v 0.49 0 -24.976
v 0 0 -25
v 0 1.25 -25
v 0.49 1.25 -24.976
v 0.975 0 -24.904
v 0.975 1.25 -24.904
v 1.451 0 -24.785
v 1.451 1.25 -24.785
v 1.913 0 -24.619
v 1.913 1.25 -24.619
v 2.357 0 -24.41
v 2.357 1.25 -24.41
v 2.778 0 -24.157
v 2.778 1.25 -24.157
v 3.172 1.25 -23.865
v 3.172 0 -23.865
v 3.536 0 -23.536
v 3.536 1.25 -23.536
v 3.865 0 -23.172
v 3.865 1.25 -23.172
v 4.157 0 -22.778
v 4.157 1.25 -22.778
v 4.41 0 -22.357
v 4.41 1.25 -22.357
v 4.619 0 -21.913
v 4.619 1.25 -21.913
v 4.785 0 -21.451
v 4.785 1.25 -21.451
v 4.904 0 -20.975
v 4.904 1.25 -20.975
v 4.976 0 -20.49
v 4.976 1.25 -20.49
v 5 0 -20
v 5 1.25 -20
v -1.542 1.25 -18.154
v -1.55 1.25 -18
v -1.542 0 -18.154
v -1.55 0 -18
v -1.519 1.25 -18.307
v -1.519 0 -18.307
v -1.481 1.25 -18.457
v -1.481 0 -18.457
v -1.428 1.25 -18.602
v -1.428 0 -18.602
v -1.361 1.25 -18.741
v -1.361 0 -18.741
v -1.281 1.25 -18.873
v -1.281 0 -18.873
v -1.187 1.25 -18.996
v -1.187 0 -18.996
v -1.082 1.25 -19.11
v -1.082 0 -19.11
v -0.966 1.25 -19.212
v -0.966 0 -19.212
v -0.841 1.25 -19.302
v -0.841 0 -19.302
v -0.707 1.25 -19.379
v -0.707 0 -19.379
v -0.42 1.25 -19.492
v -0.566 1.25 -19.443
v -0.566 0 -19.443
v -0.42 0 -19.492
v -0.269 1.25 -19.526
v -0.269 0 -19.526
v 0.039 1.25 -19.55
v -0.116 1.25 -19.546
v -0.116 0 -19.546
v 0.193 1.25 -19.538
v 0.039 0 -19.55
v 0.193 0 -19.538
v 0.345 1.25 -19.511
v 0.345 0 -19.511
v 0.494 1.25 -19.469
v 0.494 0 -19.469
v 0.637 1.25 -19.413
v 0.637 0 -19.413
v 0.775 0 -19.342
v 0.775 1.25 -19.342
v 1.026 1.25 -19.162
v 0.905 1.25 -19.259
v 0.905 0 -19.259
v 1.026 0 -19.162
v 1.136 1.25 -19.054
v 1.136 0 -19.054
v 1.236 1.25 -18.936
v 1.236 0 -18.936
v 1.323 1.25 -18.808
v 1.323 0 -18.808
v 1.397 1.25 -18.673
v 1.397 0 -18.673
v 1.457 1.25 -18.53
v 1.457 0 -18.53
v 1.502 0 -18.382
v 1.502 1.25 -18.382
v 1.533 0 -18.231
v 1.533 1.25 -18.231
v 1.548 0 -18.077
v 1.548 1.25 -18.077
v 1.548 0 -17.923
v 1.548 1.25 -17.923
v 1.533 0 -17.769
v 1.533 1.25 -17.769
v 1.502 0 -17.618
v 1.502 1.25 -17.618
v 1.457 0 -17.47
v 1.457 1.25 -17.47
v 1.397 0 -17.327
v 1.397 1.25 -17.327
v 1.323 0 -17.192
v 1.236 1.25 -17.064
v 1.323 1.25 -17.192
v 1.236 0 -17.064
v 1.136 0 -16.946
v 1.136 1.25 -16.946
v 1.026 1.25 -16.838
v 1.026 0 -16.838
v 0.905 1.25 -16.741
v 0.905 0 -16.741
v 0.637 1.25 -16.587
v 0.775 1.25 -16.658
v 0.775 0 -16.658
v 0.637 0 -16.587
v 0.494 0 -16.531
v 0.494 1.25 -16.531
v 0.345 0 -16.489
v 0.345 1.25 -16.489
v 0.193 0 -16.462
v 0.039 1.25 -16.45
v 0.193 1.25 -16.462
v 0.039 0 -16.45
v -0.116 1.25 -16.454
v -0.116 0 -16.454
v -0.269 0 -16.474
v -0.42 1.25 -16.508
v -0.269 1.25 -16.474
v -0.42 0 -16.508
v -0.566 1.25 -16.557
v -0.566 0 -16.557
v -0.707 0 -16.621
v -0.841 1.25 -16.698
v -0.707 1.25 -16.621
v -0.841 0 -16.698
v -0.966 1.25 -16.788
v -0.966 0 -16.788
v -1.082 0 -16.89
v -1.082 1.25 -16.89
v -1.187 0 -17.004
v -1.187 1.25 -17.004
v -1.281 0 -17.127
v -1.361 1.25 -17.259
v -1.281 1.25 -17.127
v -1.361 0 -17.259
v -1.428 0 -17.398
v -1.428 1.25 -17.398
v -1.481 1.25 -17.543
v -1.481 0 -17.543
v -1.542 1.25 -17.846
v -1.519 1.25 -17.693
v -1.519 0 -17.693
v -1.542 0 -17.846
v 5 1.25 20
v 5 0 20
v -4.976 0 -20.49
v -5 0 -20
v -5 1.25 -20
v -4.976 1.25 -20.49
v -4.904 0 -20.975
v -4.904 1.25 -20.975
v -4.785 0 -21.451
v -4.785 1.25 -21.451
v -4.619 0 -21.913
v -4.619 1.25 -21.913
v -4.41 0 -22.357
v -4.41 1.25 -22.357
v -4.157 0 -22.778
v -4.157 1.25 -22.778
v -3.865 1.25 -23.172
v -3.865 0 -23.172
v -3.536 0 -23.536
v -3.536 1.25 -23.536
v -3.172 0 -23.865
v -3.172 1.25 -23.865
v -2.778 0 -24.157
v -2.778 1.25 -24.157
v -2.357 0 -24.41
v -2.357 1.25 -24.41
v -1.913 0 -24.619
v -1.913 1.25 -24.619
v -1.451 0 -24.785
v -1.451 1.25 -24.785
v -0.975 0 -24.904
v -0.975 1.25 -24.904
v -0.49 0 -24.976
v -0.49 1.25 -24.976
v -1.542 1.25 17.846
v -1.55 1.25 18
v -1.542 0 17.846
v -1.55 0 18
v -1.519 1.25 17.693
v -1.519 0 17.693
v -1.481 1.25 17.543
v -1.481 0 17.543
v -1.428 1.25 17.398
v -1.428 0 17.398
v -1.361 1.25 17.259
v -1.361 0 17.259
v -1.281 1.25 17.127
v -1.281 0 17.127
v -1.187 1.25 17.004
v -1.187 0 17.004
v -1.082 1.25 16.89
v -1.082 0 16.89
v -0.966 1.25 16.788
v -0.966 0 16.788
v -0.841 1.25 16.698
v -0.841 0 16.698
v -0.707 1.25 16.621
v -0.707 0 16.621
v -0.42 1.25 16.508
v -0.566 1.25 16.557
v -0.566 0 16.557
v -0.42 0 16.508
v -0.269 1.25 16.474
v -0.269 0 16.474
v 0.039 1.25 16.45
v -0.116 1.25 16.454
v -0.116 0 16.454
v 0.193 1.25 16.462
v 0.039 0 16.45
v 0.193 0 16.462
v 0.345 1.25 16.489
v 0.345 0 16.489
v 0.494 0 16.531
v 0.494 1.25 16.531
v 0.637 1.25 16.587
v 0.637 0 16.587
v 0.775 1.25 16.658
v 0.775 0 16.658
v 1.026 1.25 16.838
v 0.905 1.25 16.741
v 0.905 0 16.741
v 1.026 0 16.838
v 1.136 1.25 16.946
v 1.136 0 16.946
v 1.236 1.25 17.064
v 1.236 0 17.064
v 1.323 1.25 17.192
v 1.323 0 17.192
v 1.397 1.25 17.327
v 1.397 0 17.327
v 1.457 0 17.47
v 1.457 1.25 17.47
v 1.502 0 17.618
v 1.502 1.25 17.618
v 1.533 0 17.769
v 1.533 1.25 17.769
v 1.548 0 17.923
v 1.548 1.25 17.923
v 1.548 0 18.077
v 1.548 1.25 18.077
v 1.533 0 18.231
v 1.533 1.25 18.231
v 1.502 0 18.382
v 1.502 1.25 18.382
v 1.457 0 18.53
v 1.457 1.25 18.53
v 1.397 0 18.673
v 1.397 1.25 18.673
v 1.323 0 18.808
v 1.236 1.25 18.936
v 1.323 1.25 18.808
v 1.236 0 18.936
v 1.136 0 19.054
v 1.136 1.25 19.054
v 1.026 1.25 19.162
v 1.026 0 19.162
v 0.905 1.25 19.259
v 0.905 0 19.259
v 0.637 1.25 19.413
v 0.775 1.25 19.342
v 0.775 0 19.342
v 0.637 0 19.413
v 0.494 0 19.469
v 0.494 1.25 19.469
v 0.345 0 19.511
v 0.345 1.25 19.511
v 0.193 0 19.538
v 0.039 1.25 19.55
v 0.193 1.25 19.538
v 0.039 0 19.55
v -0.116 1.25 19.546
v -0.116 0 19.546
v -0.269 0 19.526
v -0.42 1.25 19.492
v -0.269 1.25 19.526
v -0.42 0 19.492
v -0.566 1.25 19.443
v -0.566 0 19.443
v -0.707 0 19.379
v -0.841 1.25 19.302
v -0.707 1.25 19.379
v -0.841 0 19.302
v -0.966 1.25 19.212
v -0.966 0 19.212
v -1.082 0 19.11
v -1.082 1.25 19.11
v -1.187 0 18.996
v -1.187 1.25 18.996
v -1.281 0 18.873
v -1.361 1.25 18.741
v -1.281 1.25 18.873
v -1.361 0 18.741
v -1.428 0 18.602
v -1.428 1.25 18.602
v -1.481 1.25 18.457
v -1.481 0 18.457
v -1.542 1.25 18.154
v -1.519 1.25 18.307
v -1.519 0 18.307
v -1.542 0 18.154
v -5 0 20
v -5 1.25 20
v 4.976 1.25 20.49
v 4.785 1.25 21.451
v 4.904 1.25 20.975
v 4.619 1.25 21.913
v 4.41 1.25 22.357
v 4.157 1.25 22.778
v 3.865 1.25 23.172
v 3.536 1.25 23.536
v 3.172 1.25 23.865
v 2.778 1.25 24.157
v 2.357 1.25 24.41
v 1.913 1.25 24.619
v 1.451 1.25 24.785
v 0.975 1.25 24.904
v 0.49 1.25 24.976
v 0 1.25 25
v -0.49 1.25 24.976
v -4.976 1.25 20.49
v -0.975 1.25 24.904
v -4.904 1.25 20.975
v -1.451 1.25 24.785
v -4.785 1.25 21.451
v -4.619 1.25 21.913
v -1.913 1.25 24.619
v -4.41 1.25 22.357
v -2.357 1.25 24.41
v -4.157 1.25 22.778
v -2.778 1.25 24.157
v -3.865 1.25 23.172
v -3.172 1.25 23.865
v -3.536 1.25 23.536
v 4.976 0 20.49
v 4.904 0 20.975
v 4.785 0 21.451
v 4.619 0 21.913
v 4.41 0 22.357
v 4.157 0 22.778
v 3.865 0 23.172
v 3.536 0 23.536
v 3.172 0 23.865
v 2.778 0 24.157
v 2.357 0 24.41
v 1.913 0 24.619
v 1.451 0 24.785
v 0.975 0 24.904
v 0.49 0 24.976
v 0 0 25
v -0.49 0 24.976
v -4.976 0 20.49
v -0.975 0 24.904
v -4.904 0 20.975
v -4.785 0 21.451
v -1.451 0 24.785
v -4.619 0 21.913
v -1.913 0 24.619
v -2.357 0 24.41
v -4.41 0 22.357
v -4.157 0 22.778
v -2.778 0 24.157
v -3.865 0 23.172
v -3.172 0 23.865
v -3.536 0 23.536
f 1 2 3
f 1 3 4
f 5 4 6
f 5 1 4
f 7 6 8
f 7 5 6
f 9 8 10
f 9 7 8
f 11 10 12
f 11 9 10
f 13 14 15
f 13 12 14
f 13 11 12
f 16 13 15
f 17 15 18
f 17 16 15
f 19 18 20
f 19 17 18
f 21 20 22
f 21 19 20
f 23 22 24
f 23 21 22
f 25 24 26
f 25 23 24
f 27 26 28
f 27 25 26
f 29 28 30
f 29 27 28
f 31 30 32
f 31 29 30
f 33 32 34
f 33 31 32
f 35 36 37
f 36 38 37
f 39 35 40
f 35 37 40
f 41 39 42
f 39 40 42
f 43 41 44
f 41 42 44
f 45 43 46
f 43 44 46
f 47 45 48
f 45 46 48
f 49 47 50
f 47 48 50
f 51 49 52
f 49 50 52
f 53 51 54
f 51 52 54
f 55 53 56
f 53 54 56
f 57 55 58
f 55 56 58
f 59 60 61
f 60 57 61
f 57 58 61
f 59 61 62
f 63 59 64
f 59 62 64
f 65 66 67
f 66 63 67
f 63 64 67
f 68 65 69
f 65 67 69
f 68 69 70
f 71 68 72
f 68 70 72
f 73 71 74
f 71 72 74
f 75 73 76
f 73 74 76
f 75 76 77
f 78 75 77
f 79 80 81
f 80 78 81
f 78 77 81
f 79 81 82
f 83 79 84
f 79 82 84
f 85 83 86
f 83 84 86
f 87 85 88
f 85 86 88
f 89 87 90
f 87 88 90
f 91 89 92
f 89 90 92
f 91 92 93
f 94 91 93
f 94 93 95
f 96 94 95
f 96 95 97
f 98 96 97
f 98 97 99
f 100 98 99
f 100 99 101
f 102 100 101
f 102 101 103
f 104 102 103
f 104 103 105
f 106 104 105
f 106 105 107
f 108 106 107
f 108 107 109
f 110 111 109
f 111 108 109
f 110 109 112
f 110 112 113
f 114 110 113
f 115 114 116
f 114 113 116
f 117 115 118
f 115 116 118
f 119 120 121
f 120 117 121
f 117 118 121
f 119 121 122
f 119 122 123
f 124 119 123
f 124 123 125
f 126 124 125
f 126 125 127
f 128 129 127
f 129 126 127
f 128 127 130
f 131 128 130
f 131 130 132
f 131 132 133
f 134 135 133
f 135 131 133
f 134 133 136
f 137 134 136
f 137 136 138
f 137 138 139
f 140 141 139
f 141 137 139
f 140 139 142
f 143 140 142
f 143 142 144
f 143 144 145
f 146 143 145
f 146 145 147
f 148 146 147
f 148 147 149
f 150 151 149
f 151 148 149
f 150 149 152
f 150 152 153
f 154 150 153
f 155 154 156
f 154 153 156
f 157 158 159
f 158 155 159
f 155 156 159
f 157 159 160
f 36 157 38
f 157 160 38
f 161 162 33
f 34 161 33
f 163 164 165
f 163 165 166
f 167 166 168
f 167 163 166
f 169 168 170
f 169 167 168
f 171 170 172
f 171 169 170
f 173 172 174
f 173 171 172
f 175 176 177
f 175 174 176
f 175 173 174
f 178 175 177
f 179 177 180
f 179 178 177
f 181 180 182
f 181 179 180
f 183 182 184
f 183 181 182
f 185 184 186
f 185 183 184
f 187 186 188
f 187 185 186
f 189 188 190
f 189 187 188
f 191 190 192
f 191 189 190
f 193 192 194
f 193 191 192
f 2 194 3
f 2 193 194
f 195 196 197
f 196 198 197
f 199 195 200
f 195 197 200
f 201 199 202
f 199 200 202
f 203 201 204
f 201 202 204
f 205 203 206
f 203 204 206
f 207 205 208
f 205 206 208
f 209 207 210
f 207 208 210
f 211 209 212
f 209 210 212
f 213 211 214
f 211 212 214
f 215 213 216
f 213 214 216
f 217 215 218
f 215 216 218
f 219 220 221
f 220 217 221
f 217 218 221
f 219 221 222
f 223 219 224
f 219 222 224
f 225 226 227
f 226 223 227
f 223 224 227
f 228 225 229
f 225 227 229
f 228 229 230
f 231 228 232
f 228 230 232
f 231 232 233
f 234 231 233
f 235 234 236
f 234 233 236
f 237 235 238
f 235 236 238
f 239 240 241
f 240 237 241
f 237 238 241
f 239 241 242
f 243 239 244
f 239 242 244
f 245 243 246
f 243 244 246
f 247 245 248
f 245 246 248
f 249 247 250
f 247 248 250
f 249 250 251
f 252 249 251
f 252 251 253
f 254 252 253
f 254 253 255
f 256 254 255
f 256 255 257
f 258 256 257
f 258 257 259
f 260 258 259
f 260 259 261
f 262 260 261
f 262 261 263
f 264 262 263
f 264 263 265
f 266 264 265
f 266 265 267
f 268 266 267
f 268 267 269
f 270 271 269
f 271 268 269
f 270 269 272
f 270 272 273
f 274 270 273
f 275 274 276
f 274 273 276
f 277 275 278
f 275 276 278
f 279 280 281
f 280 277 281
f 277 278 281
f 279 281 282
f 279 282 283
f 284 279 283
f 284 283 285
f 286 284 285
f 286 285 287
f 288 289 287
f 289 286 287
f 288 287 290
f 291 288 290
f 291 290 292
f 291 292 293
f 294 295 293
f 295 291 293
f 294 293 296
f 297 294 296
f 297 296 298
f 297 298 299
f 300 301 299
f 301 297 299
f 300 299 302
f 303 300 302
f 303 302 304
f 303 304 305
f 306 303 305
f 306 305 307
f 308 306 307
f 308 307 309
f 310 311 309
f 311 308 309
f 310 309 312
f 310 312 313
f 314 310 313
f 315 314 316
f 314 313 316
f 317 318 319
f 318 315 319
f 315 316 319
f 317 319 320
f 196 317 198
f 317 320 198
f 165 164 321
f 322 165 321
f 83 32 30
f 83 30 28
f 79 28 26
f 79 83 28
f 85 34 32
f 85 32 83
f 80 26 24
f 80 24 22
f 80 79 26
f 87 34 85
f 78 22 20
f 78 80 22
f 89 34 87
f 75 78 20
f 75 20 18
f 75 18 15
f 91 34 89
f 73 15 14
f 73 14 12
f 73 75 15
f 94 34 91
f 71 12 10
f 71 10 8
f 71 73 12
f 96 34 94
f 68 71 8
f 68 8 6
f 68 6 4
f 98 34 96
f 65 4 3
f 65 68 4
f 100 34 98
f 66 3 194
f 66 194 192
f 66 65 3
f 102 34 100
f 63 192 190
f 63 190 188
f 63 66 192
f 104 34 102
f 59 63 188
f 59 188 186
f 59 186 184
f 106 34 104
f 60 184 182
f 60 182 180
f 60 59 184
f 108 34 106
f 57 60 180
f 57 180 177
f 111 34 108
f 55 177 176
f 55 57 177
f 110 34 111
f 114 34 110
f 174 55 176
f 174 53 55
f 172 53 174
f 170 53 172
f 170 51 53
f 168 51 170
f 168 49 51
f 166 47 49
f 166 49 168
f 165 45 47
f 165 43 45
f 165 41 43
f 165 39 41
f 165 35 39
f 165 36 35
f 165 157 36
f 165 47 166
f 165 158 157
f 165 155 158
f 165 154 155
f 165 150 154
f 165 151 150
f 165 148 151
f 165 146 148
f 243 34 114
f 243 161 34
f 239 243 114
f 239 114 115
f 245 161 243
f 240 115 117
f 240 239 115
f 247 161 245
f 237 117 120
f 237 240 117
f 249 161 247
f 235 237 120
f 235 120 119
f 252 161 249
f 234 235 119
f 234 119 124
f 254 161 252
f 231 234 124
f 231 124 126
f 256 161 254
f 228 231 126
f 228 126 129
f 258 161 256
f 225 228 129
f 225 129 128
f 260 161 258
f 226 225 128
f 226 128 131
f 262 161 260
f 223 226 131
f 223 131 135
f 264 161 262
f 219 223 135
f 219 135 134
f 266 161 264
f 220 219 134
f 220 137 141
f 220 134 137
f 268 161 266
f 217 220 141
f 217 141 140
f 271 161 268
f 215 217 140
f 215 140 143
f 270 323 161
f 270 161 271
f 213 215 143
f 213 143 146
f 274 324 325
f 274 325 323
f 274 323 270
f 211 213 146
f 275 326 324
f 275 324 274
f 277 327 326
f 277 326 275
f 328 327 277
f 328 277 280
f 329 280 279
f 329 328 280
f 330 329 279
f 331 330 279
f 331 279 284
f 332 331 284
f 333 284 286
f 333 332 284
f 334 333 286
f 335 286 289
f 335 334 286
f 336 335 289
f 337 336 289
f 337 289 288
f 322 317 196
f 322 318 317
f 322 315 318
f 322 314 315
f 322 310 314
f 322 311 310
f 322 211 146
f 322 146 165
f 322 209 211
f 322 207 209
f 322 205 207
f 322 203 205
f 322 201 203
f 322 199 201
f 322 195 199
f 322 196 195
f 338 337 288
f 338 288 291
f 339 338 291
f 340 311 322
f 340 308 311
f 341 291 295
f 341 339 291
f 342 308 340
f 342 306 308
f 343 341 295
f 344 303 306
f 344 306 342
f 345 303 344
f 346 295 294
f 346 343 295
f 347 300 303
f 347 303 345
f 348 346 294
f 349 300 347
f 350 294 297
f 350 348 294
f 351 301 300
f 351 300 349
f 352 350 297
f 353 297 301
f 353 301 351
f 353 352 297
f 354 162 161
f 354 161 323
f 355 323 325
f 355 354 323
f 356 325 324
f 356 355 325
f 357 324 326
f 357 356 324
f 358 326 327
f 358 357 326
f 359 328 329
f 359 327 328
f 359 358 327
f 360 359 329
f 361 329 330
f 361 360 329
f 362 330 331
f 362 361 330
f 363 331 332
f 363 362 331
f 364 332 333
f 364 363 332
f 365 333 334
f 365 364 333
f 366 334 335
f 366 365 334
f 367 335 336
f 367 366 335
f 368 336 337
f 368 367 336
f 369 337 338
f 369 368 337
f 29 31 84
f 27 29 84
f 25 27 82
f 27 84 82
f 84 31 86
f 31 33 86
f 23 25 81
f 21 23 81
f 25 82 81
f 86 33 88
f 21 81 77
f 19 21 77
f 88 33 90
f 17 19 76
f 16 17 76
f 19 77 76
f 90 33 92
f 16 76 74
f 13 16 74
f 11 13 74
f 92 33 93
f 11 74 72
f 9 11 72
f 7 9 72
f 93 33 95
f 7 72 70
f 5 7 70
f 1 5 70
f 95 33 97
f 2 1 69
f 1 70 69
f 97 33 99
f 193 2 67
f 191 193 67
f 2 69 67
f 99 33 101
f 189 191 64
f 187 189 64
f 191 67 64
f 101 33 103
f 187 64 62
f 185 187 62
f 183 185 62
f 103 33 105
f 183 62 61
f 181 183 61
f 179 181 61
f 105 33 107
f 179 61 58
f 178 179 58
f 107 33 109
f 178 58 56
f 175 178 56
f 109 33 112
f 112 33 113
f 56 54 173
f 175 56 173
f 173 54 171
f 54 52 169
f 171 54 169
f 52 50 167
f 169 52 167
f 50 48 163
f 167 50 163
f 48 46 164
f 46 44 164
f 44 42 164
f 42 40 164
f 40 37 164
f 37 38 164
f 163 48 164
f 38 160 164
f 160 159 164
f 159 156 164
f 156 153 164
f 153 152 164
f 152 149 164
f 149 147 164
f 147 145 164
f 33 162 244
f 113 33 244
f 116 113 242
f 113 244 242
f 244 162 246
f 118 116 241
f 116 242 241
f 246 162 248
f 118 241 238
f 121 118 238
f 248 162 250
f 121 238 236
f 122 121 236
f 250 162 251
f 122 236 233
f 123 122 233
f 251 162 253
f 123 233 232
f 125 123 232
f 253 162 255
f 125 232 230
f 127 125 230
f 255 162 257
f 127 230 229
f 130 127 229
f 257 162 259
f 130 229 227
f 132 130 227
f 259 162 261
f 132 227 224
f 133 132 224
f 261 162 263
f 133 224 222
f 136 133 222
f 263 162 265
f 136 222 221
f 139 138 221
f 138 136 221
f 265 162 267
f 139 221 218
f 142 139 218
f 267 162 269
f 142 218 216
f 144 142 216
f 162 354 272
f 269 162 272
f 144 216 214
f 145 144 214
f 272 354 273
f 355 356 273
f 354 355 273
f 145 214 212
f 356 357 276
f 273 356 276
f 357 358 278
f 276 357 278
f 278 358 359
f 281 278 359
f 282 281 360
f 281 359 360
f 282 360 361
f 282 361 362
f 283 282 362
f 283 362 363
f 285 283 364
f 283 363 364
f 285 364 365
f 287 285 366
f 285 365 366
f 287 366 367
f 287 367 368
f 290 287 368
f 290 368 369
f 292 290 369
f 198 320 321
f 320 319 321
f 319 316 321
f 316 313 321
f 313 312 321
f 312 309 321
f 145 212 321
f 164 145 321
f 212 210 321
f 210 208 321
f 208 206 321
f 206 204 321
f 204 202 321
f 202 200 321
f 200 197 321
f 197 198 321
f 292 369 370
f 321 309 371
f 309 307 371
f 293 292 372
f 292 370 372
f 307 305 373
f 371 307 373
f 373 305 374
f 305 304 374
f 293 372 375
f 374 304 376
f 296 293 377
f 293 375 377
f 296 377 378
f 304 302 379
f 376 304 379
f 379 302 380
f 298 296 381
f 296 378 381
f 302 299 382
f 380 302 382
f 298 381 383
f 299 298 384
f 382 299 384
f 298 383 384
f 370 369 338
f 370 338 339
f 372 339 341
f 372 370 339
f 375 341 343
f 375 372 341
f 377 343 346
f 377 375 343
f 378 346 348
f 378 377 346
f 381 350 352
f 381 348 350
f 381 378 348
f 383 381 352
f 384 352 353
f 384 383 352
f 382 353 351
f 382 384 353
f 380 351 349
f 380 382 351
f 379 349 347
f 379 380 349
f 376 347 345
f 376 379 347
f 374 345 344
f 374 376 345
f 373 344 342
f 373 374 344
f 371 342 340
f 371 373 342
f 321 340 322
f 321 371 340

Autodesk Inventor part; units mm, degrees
ref_plane "YZ Plane" through (0, 0, 0) normal (1, 0, 0) x (0, 1, 0)
ref_plane "XZ Plane" through (0, 0, 0) normal (0, 1, 0) x (-1, 0, 0)
ref_plane "XY Plane" through (0, 0, 0) normal (0, 0, 1) x (1, 0, 0)
sketch "Sketch1" plane through (0, 0, 0) normal (0, 1, 0) x (-1, 0, 0)
  circle A0 centre (0, -18) radius 1.55
  circle A1 centre (0, 18) radius 1.55
  line L0 (0, 25) -> (0, 25)
  line L1 (-5, 20) -> (-5, -20)
  line L2 (0, -25) -> (0, -25)
  line L3 (5, -20) -> (5, 20)
  arc A2 (5, 20) -> (0, 25) centre (0, 20) ccw
  arc A3 (0, 25) -> (-5, 20) centre (0, 20) ccw
  arc A4 (-5, -20) -> (0, -25) centre (0, -20) ccw
  arc A5 (0, -25) -> (5, -20) centre (0, -20) ccw
  point P0 (0, 0)
  point P1 (-5, -25)
  point P2 (-5, 25)
  point P3 (5, -25)
  point P4 (0, -25)
  dimension "d0" = 3.1
  dimension "d1" = 3.1
  dimension "d2" = 10
  dimension "d3" = 50
  dimension "d4" = 5
extrude "Extrusion1" add sketch "Sketch1" along normal blind 1.25
properties part number "KreplenieBoltam" material "Iron, Cast"
